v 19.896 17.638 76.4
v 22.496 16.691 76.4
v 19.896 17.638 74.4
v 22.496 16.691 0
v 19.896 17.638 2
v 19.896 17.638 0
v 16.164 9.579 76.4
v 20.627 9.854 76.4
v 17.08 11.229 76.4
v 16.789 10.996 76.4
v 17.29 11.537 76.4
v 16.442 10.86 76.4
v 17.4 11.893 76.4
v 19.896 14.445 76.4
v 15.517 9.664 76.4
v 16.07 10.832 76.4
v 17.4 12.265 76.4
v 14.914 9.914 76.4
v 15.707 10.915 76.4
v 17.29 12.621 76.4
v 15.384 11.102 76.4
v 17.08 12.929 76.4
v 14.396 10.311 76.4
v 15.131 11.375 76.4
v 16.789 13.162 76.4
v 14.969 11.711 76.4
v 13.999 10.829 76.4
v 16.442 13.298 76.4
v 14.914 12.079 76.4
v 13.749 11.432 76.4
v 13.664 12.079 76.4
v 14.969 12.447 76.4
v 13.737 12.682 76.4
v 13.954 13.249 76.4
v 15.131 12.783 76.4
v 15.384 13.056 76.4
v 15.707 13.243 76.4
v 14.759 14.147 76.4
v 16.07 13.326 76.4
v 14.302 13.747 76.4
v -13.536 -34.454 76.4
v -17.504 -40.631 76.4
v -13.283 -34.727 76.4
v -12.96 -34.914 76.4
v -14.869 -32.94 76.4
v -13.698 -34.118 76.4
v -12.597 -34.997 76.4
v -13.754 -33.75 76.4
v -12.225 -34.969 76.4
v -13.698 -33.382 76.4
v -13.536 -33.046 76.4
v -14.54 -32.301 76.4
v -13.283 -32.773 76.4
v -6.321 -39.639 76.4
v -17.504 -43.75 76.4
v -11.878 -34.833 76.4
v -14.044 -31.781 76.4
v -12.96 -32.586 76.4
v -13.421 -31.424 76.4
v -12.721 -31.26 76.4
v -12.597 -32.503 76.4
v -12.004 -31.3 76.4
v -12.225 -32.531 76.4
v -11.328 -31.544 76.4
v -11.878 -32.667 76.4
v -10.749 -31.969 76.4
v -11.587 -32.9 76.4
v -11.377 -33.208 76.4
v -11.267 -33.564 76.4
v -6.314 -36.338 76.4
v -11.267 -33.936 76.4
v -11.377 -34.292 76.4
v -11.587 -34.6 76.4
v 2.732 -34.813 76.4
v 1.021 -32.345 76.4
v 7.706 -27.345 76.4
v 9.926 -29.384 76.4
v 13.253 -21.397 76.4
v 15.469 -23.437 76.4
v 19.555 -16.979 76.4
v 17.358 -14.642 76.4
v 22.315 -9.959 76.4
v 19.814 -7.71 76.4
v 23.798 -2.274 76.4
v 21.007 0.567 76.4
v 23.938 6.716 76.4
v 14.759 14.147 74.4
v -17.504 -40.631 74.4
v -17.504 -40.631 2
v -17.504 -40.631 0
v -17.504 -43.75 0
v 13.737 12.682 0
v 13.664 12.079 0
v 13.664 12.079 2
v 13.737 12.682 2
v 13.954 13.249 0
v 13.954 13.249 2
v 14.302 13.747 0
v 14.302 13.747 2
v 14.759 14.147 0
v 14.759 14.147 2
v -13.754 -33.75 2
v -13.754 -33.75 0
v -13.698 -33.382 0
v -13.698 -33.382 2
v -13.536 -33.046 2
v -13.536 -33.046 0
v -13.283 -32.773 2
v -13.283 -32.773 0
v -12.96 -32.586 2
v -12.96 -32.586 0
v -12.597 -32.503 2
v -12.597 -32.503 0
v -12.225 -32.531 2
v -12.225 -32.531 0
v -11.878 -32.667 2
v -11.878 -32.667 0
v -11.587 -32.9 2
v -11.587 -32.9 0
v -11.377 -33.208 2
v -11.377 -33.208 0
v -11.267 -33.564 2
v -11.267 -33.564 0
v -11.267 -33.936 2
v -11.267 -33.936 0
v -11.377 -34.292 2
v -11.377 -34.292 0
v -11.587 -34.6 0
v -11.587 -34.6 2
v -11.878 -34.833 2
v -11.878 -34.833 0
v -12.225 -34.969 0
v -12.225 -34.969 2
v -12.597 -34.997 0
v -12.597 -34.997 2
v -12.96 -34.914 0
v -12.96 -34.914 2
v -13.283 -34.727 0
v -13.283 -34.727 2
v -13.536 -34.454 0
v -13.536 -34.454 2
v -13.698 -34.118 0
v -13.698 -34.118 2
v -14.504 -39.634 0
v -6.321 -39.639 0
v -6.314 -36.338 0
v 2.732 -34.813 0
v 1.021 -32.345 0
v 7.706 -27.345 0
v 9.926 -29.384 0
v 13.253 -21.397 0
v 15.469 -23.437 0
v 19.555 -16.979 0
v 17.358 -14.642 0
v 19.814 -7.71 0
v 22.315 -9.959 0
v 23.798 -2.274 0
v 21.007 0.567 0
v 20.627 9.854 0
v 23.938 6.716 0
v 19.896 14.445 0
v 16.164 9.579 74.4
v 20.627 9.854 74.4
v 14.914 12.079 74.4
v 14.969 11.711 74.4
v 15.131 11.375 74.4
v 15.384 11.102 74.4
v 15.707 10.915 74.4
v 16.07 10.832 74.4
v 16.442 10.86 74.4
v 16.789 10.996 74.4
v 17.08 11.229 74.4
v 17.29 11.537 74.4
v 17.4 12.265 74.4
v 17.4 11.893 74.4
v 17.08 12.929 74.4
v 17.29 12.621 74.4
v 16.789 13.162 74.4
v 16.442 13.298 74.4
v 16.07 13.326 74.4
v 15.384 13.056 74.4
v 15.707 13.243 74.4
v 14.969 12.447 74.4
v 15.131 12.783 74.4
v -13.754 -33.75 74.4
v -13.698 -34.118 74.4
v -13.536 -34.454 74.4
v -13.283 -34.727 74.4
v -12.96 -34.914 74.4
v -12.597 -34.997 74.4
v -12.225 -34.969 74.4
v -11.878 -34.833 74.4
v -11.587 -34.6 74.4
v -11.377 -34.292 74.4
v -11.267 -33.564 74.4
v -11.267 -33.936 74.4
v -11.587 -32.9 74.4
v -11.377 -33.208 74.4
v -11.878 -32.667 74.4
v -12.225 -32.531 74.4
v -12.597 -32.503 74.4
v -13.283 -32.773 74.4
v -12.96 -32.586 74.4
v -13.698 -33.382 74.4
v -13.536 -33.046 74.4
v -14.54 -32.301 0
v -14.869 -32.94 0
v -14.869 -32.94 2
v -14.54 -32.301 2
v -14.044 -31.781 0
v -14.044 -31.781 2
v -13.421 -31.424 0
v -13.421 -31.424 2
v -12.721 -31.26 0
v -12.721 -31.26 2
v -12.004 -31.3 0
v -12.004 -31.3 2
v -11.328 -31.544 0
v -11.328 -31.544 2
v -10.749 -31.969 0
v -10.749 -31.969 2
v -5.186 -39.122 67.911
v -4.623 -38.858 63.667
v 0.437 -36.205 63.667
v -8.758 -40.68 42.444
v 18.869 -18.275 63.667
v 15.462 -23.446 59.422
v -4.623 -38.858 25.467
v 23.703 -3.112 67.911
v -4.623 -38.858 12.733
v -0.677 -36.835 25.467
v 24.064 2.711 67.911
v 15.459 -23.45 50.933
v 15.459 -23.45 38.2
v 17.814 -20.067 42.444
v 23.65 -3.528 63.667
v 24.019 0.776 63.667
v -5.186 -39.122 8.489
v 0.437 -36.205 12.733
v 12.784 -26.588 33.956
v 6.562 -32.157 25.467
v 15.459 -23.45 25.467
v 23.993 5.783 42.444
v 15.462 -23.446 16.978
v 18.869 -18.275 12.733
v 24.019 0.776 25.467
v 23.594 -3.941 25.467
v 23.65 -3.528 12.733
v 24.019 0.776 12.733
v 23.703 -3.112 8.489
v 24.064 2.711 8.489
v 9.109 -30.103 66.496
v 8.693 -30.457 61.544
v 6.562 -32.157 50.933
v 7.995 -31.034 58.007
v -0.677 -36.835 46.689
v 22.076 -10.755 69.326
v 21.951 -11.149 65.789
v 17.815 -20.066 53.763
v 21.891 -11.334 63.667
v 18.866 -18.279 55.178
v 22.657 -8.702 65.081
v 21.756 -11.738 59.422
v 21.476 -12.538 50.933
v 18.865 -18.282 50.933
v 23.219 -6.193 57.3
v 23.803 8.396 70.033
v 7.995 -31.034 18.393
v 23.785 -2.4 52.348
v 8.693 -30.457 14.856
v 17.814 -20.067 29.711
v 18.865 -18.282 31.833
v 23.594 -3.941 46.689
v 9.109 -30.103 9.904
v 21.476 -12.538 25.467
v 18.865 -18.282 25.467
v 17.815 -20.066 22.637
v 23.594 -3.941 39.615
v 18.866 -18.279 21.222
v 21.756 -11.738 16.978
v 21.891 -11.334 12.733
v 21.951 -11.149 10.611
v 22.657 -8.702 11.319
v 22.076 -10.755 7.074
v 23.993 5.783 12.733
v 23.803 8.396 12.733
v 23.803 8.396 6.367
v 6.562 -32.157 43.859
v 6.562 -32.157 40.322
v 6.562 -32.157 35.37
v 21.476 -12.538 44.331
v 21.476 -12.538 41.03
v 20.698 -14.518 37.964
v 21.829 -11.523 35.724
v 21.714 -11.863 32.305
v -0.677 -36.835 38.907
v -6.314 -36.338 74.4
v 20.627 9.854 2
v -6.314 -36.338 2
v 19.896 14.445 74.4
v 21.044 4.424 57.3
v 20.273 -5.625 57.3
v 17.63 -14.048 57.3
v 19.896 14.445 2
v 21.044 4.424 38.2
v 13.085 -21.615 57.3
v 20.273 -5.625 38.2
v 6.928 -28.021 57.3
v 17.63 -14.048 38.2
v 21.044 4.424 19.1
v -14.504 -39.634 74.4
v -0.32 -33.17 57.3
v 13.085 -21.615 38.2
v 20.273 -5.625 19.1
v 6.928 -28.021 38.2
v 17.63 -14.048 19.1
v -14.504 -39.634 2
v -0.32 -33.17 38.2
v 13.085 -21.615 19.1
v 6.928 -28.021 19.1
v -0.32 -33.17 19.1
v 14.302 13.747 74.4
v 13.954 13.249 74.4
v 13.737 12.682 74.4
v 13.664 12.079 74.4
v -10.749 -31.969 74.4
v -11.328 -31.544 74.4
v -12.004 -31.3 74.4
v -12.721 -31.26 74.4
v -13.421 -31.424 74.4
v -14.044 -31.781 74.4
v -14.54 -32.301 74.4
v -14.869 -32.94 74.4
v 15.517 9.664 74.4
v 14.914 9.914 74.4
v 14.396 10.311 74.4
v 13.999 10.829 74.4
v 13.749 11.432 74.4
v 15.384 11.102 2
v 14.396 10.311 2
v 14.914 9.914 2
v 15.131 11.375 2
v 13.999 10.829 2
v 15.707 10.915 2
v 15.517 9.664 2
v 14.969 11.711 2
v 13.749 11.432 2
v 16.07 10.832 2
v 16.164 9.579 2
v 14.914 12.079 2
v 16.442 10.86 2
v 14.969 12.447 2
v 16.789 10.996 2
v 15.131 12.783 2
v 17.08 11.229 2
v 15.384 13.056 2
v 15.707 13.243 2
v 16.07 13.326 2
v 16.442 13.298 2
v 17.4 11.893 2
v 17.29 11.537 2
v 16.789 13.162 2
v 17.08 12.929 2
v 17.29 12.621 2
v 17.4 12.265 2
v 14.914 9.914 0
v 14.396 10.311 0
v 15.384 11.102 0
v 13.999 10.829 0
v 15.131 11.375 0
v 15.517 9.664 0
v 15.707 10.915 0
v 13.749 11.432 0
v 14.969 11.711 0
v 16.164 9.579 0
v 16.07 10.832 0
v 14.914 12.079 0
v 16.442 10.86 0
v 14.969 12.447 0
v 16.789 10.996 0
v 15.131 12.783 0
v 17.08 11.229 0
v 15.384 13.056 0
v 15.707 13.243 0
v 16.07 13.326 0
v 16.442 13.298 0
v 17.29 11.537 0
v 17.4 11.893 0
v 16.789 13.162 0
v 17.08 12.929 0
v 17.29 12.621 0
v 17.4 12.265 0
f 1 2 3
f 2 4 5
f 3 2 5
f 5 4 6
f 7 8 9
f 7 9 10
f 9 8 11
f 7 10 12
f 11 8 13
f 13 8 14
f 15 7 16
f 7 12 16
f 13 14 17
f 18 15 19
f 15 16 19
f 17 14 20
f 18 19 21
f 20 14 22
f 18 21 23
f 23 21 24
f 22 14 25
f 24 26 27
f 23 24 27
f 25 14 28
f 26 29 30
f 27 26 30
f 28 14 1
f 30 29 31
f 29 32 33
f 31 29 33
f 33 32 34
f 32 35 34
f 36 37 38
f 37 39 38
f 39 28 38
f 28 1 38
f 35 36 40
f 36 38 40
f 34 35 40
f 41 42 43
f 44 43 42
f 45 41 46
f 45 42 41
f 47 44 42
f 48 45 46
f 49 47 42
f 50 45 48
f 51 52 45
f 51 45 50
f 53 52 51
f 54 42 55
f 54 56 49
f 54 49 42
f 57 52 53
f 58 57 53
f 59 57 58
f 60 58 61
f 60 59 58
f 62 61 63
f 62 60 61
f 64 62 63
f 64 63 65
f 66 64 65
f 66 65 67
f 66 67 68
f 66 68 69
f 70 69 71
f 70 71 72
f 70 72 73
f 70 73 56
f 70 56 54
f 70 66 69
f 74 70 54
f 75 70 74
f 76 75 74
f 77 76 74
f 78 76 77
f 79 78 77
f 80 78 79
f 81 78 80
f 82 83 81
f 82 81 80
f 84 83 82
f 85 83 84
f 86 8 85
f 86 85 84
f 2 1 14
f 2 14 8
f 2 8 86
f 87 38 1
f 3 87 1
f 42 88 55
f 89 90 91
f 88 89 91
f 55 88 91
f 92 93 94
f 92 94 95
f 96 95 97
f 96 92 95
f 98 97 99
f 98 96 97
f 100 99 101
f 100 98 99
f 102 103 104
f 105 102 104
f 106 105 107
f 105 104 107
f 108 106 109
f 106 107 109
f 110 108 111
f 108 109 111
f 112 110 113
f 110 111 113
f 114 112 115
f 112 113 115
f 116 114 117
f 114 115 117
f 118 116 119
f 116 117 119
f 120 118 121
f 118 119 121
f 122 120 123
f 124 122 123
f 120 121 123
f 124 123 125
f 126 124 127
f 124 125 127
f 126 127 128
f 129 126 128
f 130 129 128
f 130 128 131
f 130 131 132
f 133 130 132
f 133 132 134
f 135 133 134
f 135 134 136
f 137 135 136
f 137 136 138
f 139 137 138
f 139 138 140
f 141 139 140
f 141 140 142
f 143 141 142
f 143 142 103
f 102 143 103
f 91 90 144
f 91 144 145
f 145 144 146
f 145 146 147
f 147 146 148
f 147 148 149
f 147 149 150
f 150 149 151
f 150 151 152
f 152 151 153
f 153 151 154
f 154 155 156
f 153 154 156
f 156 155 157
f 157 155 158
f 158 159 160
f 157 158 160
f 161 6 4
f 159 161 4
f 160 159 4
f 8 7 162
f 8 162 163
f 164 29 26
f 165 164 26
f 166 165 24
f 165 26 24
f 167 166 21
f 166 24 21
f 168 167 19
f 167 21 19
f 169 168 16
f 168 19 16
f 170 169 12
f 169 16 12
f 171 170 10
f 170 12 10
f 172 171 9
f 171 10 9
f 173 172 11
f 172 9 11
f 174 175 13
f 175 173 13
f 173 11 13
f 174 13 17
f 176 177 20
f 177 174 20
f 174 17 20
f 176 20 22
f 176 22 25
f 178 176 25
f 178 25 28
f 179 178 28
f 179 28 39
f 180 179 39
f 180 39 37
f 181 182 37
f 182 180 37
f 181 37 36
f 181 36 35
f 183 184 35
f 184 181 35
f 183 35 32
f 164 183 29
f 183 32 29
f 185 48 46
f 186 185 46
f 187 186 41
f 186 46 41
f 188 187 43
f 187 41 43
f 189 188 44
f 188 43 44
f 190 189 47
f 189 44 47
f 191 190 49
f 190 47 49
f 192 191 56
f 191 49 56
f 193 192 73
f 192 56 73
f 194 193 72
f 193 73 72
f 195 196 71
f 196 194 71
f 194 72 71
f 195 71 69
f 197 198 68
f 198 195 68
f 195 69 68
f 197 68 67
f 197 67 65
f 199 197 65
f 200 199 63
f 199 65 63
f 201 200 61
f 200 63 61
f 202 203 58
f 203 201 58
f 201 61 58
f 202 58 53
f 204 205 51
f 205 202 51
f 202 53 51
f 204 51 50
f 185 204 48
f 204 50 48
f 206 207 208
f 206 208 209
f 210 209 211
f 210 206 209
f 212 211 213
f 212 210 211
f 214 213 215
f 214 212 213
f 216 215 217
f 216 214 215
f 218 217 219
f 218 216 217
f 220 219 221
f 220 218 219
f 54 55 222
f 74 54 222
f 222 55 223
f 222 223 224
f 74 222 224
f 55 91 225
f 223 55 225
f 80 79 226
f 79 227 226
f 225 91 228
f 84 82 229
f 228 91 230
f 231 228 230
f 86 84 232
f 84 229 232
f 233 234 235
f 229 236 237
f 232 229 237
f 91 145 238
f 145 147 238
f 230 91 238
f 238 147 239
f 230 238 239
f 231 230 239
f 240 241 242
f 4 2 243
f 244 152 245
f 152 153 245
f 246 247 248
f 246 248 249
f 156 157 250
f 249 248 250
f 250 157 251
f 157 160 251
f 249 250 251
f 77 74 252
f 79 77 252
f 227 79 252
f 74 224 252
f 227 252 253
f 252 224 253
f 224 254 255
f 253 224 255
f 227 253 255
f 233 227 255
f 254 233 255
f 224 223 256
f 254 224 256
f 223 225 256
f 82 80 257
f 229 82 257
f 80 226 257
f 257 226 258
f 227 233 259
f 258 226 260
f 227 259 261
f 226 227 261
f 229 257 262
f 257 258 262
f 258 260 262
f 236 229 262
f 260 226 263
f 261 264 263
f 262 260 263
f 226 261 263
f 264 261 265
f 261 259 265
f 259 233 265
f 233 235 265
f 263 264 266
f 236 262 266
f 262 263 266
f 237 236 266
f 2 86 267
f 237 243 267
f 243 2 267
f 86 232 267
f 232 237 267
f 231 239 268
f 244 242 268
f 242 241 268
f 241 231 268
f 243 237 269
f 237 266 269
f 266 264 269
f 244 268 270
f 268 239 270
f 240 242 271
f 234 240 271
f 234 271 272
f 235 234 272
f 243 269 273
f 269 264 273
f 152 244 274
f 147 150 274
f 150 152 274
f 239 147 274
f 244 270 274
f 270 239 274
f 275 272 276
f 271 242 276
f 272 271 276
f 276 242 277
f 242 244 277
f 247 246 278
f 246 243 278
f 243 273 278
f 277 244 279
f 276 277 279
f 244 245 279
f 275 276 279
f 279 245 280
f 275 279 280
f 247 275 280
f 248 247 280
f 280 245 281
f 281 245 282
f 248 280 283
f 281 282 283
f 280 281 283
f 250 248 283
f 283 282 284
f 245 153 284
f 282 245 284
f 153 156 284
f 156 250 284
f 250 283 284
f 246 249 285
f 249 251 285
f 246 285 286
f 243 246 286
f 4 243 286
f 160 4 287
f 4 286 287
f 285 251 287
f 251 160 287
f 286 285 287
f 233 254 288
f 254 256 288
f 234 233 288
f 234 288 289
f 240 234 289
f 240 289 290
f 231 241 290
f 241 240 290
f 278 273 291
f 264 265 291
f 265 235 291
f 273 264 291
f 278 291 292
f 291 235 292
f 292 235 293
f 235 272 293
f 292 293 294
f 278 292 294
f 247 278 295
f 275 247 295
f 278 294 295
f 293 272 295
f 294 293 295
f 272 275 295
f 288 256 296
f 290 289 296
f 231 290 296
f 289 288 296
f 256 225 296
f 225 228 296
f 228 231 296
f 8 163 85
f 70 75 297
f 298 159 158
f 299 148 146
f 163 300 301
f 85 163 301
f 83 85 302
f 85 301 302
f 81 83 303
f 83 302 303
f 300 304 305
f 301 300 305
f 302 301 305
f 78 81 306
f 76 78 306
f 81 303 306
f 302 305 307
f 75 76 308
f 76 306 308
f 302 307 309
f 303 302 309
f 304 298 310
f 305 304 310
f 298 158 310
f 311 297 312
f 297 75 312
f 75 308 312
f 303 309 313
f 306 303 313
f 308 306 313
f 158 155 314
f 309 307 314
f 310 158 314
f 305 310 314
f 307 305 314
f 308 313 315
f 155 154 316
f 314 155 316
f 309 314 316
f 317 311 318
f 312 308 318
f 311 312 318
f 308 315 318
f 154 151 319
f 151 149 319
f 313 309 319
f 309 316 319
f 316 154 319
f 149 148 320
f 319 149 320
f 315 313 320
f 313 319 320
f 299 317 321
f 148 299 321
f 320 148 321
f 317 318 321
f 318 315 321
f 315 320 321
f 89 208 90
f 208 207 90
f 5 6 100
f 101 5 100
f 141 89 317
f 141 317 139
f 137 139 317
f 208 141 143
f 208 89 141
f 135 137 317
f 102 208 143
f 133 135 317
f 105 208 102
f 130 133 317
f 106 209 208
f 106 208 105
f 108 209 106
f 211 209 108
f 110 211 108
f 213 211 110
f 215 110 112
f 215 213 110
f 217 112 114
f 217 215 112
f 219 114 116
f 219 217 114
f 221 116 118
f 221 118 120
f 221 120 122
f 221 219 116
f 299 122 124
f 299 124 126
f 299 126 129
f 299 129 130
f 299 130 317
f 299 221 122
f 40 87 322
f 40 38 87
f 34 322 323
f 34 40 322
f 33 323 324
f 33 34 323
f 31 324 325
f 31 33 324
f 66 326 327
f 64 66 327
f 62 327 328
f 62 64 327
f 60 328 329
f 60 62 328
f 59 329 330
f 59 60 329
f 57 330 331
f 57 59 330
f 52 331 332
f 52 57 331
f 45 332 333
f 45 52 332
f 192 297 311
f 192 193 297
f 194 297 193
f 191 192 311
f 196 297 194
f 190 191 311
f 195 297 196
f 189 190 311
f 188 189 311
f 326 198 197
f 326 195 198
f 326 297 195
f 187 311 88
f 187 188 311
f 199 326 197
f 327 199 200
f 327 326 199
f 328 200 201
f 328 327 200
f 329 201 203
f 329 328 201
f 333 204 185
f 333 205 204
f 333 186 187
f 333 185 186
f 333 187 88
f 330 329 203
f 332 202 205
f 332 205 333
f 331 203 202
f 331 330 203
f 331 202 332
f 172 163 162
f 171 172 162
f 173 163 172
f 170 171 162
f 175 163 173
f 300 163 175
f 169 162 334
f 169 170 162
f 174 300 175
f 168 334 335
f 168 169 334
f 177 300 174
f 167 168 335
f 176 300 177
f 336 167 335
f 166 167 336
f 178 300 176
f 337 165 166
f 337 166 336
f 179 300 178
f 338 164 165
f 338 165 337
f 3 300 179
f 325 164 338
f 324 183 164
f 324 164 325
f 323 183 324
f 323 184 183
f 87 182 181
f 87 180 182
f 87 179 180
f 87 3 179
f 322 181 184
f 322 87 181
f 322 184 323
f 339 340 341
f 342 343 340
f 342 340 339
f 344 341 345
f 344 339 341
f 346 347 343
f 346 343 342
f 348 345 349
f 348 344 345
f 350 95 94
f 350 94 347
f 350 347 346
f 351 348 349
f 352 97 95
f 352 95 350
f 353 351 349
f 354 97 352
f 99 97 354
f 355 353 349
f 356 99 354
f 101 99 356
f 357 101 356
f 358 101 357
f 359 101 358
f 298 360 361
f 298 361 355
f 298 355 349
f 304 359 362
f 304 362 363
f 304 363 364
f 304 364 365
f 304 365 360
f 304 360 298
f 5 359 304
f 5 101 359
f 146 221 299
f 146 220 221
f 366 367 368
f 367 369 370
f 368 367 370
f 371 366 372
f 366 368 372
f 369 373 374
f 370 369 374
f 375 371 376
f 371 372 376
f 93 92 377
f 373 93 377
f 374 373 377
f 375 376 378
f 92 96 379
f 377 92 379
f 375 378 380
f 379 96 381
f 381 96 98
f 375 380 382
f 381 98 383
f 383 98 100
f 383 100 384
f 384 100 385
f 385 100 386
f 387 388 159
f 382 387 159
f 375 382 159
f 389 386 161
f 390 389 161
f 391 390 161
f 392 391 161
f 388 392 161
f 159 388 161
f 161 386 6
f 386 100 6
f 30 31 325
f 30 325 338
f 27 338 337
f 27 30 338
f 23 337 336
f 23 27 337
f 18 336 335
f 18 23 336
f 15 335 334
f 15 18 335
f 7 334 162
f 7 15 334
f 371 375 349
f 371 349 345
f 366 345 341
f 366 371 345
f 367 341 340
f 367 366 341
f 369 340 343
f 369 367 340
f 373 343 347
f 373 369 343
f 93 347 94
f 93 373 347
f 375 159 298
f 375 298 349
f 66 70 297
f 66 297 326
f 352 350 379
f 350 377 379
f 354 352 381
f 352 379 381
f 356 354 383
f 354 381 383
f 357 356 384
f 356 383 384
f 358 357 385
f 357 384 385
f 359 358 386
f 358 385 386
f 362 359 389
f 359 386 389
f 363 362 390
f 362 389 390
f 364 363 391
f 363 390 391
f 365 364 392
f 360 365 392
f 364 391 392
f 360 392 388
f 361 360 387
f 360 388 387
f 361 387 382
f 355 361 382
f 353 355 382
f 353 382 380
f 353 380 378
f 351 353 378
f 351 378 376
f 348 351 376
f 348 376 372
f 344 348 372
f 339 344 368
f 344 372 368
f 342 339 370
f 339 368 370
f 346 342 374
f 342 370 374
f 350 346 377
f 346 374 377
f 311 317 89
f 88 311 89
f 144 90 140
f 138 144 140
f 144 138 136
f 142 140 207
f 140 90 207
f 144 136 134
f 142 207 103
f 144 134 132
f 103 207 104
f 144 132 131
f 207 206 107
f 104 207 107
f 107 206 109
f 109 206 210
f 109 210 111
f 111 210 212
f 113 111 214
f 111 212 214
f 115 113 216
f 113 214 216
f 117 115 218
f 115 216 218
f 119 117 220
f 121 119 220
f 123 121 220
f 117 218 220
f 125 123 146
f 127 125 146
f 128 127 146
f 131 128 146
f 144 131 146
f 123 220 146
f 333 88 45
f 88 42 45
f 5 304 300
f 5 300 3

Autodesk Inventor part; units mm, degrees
ref_plane "Work Plane1" through (0, 0, 0) normal (0, 0, 1) x (1, 0, 0)
sketch "Sketch1" plane through (0, 0, 0) normal (0, 0, 1) x (1, 0, 0)
  spline S0 degree 3 poles (-17.5035, -43.75) (9.5564, -35.6427) (30.0035, -17.8707) (22.4965, 16.6912) knots 1 1 1 1 2 2 2 2 projected
  line L0 (22.4965, 16.6912) -> (-1.9986, 25.6067) projected
  line L1 (-17.5035, 14.75) -> (-17.5035, -43.75) projected
  line L2 (-3.0246, 22.7876) -> (19.8959, 14.4452)
  line L3 (-14.5035, -39.6343) -> (-14.5035, 14.75)
  line L4 (19.8959, 14.4452) -> (19.8959, 17.6377)
  line L5 (-14.5035, -39.6343) -> (-17.5035, -40.6309)
  spline S1 degree 5 poles (19.896, 14.4452) (20.6656, 10.4799) (21.1568, 6.4613) (21.3154, 2.402) (20.7956, -5.2165) (18.5576, -12.5026) (17.0978, -15.7703) (13.3907, -21.8782) (8.4101, -27.002) (5.6606, -29.2971) (0.173, -33.1415) (-5.7852, -36.2005) (-8.6407, -37.4765) (-11.551, -38.6165) (-14.5035, -39.6343) knots 0 0 0 0 0 0 0.283225 0.283225 0.283225 0.531381 0.531381 0.531381 0.781029 0.781029 0.781029 1 1 1 1 1 1
  point P0 (0, 0)
  dimension "d0" = 3
  dimension "d1" = 3.1612
extrude "Extrusion1" add sketch "Sketch1" along normal blind 76.4
ref_plane "Work Plane2" through (0, 0, 76.4) normal (0, 0, -1) x (-1, 0, 0)
sketch "Sketch2" plane through (0, 0, 76.4) normal (0, 0, -1) x (-1, 0, 0)
  circle A0 centre (12.5035, -33.75) radius 1.25 projected
  line L0 (14.5035, -39.6343) -> (17.5035, -40.6309) projected
  line L1 (17.5035, -40.6309) -> (14.5806, -32.0992)
  line L2 (6.1137, -36.5355) -> (12.1128, -30.6255)
  circle A1 centre (12.5035, -33.75) radius 2.5
  spline S0 degree 5 poles (-19.8959, 14.4452) (-20.6656, 10.4799) (-21.1568, 6.4613) (-21.3154, 2.402) (-20.7956, -5.2165) (-18.5576, -12.5026) (-17.0978, -15.7703) (-13.3907, -21.8782) (-8.4101, -27.002) (-5.6606, -29.2971) (-0.173, -33.1415) (5.7852, -36.2005) (8.6407, -37.4765) (11.551, -38.6165) (14.5035, -39.6343) knots 0 0 0 0 0 0 0.283225 0.283225 0.283225 0.531381 0.531381 0.531381 0.781029 0.781029 0.781029 1 1 1 1 1 1 projected
  point P0 (0, 0)
  point P1 (14.8685, -32.9397)
  point P2 (10.749, -31.9691)
  point P3 (6.3139, -36.3383)
  dimension "d4" = 5
extrude "Extrusion2" add sketch "Sketch2" along normal blind 2
ref_plane "Work Plane3" through (0, 0, 76.4) normal (0, 0, -1) x (-1, 0, 0)
sketch "Sketch3" plane through (0, 0, 76.4) normal (0, 0, -1) x (-1, 0, 0)
  circle A0 centre (-16.1637, 12.079) radius 1.25 projected
  circle A1 centre (-16.1637, 12.079) radius 2.5
  line L0 (-19.8959, 17.6377) -> (-19.8959, 14.4452) projected
  line L1 (-14.7586, 14.1468) -> (-19.8959, 17.6377)
  line L2 (-16.1637, 9.579) -> (-20.6272, 9.8544)
  spline S0 degree 5 poles (-19.8959, 14.4452) (-20.6656, 10.4799) (-21.1568, 6.4613) (-21.3154, 2.402) (-20.7956, -5.2165) (-18.5576, -12.5026) (-17.0978, -15.7703) (-13.3907, -21.8782) (-8.4101, -27.002) (-5.6606, -29.2971) (-1.6234, -32.1254) (2.6686, -34.5287) (3.8695, -35.1608) (5.0852, -35.7635) (6.3139, -36.3383) knots 0 0 0 0 0 0 0.323263 0.323263 0.323263 0.6065 0.6065 0.6065 0.891438 0.891438 0.891438 1 1 1 1 1 1 projected
  point P0 (0, 0)
  dimension "d7" = 5
extrude "Extrusion3" add sketch "Sketch3" along normal blind 2
ref_plane "Work Plane4" through (0, 0, 38.2) normal (0, 0, -1) x (-1, 0, 0)
mirror "Mirror1" about plane through (0, 0, 38.2) normal (0, 0, -1) of "Extrusion3", "Extrusion2"
properties part number "clamsheel sheet surface" material "ABS Plastic"
